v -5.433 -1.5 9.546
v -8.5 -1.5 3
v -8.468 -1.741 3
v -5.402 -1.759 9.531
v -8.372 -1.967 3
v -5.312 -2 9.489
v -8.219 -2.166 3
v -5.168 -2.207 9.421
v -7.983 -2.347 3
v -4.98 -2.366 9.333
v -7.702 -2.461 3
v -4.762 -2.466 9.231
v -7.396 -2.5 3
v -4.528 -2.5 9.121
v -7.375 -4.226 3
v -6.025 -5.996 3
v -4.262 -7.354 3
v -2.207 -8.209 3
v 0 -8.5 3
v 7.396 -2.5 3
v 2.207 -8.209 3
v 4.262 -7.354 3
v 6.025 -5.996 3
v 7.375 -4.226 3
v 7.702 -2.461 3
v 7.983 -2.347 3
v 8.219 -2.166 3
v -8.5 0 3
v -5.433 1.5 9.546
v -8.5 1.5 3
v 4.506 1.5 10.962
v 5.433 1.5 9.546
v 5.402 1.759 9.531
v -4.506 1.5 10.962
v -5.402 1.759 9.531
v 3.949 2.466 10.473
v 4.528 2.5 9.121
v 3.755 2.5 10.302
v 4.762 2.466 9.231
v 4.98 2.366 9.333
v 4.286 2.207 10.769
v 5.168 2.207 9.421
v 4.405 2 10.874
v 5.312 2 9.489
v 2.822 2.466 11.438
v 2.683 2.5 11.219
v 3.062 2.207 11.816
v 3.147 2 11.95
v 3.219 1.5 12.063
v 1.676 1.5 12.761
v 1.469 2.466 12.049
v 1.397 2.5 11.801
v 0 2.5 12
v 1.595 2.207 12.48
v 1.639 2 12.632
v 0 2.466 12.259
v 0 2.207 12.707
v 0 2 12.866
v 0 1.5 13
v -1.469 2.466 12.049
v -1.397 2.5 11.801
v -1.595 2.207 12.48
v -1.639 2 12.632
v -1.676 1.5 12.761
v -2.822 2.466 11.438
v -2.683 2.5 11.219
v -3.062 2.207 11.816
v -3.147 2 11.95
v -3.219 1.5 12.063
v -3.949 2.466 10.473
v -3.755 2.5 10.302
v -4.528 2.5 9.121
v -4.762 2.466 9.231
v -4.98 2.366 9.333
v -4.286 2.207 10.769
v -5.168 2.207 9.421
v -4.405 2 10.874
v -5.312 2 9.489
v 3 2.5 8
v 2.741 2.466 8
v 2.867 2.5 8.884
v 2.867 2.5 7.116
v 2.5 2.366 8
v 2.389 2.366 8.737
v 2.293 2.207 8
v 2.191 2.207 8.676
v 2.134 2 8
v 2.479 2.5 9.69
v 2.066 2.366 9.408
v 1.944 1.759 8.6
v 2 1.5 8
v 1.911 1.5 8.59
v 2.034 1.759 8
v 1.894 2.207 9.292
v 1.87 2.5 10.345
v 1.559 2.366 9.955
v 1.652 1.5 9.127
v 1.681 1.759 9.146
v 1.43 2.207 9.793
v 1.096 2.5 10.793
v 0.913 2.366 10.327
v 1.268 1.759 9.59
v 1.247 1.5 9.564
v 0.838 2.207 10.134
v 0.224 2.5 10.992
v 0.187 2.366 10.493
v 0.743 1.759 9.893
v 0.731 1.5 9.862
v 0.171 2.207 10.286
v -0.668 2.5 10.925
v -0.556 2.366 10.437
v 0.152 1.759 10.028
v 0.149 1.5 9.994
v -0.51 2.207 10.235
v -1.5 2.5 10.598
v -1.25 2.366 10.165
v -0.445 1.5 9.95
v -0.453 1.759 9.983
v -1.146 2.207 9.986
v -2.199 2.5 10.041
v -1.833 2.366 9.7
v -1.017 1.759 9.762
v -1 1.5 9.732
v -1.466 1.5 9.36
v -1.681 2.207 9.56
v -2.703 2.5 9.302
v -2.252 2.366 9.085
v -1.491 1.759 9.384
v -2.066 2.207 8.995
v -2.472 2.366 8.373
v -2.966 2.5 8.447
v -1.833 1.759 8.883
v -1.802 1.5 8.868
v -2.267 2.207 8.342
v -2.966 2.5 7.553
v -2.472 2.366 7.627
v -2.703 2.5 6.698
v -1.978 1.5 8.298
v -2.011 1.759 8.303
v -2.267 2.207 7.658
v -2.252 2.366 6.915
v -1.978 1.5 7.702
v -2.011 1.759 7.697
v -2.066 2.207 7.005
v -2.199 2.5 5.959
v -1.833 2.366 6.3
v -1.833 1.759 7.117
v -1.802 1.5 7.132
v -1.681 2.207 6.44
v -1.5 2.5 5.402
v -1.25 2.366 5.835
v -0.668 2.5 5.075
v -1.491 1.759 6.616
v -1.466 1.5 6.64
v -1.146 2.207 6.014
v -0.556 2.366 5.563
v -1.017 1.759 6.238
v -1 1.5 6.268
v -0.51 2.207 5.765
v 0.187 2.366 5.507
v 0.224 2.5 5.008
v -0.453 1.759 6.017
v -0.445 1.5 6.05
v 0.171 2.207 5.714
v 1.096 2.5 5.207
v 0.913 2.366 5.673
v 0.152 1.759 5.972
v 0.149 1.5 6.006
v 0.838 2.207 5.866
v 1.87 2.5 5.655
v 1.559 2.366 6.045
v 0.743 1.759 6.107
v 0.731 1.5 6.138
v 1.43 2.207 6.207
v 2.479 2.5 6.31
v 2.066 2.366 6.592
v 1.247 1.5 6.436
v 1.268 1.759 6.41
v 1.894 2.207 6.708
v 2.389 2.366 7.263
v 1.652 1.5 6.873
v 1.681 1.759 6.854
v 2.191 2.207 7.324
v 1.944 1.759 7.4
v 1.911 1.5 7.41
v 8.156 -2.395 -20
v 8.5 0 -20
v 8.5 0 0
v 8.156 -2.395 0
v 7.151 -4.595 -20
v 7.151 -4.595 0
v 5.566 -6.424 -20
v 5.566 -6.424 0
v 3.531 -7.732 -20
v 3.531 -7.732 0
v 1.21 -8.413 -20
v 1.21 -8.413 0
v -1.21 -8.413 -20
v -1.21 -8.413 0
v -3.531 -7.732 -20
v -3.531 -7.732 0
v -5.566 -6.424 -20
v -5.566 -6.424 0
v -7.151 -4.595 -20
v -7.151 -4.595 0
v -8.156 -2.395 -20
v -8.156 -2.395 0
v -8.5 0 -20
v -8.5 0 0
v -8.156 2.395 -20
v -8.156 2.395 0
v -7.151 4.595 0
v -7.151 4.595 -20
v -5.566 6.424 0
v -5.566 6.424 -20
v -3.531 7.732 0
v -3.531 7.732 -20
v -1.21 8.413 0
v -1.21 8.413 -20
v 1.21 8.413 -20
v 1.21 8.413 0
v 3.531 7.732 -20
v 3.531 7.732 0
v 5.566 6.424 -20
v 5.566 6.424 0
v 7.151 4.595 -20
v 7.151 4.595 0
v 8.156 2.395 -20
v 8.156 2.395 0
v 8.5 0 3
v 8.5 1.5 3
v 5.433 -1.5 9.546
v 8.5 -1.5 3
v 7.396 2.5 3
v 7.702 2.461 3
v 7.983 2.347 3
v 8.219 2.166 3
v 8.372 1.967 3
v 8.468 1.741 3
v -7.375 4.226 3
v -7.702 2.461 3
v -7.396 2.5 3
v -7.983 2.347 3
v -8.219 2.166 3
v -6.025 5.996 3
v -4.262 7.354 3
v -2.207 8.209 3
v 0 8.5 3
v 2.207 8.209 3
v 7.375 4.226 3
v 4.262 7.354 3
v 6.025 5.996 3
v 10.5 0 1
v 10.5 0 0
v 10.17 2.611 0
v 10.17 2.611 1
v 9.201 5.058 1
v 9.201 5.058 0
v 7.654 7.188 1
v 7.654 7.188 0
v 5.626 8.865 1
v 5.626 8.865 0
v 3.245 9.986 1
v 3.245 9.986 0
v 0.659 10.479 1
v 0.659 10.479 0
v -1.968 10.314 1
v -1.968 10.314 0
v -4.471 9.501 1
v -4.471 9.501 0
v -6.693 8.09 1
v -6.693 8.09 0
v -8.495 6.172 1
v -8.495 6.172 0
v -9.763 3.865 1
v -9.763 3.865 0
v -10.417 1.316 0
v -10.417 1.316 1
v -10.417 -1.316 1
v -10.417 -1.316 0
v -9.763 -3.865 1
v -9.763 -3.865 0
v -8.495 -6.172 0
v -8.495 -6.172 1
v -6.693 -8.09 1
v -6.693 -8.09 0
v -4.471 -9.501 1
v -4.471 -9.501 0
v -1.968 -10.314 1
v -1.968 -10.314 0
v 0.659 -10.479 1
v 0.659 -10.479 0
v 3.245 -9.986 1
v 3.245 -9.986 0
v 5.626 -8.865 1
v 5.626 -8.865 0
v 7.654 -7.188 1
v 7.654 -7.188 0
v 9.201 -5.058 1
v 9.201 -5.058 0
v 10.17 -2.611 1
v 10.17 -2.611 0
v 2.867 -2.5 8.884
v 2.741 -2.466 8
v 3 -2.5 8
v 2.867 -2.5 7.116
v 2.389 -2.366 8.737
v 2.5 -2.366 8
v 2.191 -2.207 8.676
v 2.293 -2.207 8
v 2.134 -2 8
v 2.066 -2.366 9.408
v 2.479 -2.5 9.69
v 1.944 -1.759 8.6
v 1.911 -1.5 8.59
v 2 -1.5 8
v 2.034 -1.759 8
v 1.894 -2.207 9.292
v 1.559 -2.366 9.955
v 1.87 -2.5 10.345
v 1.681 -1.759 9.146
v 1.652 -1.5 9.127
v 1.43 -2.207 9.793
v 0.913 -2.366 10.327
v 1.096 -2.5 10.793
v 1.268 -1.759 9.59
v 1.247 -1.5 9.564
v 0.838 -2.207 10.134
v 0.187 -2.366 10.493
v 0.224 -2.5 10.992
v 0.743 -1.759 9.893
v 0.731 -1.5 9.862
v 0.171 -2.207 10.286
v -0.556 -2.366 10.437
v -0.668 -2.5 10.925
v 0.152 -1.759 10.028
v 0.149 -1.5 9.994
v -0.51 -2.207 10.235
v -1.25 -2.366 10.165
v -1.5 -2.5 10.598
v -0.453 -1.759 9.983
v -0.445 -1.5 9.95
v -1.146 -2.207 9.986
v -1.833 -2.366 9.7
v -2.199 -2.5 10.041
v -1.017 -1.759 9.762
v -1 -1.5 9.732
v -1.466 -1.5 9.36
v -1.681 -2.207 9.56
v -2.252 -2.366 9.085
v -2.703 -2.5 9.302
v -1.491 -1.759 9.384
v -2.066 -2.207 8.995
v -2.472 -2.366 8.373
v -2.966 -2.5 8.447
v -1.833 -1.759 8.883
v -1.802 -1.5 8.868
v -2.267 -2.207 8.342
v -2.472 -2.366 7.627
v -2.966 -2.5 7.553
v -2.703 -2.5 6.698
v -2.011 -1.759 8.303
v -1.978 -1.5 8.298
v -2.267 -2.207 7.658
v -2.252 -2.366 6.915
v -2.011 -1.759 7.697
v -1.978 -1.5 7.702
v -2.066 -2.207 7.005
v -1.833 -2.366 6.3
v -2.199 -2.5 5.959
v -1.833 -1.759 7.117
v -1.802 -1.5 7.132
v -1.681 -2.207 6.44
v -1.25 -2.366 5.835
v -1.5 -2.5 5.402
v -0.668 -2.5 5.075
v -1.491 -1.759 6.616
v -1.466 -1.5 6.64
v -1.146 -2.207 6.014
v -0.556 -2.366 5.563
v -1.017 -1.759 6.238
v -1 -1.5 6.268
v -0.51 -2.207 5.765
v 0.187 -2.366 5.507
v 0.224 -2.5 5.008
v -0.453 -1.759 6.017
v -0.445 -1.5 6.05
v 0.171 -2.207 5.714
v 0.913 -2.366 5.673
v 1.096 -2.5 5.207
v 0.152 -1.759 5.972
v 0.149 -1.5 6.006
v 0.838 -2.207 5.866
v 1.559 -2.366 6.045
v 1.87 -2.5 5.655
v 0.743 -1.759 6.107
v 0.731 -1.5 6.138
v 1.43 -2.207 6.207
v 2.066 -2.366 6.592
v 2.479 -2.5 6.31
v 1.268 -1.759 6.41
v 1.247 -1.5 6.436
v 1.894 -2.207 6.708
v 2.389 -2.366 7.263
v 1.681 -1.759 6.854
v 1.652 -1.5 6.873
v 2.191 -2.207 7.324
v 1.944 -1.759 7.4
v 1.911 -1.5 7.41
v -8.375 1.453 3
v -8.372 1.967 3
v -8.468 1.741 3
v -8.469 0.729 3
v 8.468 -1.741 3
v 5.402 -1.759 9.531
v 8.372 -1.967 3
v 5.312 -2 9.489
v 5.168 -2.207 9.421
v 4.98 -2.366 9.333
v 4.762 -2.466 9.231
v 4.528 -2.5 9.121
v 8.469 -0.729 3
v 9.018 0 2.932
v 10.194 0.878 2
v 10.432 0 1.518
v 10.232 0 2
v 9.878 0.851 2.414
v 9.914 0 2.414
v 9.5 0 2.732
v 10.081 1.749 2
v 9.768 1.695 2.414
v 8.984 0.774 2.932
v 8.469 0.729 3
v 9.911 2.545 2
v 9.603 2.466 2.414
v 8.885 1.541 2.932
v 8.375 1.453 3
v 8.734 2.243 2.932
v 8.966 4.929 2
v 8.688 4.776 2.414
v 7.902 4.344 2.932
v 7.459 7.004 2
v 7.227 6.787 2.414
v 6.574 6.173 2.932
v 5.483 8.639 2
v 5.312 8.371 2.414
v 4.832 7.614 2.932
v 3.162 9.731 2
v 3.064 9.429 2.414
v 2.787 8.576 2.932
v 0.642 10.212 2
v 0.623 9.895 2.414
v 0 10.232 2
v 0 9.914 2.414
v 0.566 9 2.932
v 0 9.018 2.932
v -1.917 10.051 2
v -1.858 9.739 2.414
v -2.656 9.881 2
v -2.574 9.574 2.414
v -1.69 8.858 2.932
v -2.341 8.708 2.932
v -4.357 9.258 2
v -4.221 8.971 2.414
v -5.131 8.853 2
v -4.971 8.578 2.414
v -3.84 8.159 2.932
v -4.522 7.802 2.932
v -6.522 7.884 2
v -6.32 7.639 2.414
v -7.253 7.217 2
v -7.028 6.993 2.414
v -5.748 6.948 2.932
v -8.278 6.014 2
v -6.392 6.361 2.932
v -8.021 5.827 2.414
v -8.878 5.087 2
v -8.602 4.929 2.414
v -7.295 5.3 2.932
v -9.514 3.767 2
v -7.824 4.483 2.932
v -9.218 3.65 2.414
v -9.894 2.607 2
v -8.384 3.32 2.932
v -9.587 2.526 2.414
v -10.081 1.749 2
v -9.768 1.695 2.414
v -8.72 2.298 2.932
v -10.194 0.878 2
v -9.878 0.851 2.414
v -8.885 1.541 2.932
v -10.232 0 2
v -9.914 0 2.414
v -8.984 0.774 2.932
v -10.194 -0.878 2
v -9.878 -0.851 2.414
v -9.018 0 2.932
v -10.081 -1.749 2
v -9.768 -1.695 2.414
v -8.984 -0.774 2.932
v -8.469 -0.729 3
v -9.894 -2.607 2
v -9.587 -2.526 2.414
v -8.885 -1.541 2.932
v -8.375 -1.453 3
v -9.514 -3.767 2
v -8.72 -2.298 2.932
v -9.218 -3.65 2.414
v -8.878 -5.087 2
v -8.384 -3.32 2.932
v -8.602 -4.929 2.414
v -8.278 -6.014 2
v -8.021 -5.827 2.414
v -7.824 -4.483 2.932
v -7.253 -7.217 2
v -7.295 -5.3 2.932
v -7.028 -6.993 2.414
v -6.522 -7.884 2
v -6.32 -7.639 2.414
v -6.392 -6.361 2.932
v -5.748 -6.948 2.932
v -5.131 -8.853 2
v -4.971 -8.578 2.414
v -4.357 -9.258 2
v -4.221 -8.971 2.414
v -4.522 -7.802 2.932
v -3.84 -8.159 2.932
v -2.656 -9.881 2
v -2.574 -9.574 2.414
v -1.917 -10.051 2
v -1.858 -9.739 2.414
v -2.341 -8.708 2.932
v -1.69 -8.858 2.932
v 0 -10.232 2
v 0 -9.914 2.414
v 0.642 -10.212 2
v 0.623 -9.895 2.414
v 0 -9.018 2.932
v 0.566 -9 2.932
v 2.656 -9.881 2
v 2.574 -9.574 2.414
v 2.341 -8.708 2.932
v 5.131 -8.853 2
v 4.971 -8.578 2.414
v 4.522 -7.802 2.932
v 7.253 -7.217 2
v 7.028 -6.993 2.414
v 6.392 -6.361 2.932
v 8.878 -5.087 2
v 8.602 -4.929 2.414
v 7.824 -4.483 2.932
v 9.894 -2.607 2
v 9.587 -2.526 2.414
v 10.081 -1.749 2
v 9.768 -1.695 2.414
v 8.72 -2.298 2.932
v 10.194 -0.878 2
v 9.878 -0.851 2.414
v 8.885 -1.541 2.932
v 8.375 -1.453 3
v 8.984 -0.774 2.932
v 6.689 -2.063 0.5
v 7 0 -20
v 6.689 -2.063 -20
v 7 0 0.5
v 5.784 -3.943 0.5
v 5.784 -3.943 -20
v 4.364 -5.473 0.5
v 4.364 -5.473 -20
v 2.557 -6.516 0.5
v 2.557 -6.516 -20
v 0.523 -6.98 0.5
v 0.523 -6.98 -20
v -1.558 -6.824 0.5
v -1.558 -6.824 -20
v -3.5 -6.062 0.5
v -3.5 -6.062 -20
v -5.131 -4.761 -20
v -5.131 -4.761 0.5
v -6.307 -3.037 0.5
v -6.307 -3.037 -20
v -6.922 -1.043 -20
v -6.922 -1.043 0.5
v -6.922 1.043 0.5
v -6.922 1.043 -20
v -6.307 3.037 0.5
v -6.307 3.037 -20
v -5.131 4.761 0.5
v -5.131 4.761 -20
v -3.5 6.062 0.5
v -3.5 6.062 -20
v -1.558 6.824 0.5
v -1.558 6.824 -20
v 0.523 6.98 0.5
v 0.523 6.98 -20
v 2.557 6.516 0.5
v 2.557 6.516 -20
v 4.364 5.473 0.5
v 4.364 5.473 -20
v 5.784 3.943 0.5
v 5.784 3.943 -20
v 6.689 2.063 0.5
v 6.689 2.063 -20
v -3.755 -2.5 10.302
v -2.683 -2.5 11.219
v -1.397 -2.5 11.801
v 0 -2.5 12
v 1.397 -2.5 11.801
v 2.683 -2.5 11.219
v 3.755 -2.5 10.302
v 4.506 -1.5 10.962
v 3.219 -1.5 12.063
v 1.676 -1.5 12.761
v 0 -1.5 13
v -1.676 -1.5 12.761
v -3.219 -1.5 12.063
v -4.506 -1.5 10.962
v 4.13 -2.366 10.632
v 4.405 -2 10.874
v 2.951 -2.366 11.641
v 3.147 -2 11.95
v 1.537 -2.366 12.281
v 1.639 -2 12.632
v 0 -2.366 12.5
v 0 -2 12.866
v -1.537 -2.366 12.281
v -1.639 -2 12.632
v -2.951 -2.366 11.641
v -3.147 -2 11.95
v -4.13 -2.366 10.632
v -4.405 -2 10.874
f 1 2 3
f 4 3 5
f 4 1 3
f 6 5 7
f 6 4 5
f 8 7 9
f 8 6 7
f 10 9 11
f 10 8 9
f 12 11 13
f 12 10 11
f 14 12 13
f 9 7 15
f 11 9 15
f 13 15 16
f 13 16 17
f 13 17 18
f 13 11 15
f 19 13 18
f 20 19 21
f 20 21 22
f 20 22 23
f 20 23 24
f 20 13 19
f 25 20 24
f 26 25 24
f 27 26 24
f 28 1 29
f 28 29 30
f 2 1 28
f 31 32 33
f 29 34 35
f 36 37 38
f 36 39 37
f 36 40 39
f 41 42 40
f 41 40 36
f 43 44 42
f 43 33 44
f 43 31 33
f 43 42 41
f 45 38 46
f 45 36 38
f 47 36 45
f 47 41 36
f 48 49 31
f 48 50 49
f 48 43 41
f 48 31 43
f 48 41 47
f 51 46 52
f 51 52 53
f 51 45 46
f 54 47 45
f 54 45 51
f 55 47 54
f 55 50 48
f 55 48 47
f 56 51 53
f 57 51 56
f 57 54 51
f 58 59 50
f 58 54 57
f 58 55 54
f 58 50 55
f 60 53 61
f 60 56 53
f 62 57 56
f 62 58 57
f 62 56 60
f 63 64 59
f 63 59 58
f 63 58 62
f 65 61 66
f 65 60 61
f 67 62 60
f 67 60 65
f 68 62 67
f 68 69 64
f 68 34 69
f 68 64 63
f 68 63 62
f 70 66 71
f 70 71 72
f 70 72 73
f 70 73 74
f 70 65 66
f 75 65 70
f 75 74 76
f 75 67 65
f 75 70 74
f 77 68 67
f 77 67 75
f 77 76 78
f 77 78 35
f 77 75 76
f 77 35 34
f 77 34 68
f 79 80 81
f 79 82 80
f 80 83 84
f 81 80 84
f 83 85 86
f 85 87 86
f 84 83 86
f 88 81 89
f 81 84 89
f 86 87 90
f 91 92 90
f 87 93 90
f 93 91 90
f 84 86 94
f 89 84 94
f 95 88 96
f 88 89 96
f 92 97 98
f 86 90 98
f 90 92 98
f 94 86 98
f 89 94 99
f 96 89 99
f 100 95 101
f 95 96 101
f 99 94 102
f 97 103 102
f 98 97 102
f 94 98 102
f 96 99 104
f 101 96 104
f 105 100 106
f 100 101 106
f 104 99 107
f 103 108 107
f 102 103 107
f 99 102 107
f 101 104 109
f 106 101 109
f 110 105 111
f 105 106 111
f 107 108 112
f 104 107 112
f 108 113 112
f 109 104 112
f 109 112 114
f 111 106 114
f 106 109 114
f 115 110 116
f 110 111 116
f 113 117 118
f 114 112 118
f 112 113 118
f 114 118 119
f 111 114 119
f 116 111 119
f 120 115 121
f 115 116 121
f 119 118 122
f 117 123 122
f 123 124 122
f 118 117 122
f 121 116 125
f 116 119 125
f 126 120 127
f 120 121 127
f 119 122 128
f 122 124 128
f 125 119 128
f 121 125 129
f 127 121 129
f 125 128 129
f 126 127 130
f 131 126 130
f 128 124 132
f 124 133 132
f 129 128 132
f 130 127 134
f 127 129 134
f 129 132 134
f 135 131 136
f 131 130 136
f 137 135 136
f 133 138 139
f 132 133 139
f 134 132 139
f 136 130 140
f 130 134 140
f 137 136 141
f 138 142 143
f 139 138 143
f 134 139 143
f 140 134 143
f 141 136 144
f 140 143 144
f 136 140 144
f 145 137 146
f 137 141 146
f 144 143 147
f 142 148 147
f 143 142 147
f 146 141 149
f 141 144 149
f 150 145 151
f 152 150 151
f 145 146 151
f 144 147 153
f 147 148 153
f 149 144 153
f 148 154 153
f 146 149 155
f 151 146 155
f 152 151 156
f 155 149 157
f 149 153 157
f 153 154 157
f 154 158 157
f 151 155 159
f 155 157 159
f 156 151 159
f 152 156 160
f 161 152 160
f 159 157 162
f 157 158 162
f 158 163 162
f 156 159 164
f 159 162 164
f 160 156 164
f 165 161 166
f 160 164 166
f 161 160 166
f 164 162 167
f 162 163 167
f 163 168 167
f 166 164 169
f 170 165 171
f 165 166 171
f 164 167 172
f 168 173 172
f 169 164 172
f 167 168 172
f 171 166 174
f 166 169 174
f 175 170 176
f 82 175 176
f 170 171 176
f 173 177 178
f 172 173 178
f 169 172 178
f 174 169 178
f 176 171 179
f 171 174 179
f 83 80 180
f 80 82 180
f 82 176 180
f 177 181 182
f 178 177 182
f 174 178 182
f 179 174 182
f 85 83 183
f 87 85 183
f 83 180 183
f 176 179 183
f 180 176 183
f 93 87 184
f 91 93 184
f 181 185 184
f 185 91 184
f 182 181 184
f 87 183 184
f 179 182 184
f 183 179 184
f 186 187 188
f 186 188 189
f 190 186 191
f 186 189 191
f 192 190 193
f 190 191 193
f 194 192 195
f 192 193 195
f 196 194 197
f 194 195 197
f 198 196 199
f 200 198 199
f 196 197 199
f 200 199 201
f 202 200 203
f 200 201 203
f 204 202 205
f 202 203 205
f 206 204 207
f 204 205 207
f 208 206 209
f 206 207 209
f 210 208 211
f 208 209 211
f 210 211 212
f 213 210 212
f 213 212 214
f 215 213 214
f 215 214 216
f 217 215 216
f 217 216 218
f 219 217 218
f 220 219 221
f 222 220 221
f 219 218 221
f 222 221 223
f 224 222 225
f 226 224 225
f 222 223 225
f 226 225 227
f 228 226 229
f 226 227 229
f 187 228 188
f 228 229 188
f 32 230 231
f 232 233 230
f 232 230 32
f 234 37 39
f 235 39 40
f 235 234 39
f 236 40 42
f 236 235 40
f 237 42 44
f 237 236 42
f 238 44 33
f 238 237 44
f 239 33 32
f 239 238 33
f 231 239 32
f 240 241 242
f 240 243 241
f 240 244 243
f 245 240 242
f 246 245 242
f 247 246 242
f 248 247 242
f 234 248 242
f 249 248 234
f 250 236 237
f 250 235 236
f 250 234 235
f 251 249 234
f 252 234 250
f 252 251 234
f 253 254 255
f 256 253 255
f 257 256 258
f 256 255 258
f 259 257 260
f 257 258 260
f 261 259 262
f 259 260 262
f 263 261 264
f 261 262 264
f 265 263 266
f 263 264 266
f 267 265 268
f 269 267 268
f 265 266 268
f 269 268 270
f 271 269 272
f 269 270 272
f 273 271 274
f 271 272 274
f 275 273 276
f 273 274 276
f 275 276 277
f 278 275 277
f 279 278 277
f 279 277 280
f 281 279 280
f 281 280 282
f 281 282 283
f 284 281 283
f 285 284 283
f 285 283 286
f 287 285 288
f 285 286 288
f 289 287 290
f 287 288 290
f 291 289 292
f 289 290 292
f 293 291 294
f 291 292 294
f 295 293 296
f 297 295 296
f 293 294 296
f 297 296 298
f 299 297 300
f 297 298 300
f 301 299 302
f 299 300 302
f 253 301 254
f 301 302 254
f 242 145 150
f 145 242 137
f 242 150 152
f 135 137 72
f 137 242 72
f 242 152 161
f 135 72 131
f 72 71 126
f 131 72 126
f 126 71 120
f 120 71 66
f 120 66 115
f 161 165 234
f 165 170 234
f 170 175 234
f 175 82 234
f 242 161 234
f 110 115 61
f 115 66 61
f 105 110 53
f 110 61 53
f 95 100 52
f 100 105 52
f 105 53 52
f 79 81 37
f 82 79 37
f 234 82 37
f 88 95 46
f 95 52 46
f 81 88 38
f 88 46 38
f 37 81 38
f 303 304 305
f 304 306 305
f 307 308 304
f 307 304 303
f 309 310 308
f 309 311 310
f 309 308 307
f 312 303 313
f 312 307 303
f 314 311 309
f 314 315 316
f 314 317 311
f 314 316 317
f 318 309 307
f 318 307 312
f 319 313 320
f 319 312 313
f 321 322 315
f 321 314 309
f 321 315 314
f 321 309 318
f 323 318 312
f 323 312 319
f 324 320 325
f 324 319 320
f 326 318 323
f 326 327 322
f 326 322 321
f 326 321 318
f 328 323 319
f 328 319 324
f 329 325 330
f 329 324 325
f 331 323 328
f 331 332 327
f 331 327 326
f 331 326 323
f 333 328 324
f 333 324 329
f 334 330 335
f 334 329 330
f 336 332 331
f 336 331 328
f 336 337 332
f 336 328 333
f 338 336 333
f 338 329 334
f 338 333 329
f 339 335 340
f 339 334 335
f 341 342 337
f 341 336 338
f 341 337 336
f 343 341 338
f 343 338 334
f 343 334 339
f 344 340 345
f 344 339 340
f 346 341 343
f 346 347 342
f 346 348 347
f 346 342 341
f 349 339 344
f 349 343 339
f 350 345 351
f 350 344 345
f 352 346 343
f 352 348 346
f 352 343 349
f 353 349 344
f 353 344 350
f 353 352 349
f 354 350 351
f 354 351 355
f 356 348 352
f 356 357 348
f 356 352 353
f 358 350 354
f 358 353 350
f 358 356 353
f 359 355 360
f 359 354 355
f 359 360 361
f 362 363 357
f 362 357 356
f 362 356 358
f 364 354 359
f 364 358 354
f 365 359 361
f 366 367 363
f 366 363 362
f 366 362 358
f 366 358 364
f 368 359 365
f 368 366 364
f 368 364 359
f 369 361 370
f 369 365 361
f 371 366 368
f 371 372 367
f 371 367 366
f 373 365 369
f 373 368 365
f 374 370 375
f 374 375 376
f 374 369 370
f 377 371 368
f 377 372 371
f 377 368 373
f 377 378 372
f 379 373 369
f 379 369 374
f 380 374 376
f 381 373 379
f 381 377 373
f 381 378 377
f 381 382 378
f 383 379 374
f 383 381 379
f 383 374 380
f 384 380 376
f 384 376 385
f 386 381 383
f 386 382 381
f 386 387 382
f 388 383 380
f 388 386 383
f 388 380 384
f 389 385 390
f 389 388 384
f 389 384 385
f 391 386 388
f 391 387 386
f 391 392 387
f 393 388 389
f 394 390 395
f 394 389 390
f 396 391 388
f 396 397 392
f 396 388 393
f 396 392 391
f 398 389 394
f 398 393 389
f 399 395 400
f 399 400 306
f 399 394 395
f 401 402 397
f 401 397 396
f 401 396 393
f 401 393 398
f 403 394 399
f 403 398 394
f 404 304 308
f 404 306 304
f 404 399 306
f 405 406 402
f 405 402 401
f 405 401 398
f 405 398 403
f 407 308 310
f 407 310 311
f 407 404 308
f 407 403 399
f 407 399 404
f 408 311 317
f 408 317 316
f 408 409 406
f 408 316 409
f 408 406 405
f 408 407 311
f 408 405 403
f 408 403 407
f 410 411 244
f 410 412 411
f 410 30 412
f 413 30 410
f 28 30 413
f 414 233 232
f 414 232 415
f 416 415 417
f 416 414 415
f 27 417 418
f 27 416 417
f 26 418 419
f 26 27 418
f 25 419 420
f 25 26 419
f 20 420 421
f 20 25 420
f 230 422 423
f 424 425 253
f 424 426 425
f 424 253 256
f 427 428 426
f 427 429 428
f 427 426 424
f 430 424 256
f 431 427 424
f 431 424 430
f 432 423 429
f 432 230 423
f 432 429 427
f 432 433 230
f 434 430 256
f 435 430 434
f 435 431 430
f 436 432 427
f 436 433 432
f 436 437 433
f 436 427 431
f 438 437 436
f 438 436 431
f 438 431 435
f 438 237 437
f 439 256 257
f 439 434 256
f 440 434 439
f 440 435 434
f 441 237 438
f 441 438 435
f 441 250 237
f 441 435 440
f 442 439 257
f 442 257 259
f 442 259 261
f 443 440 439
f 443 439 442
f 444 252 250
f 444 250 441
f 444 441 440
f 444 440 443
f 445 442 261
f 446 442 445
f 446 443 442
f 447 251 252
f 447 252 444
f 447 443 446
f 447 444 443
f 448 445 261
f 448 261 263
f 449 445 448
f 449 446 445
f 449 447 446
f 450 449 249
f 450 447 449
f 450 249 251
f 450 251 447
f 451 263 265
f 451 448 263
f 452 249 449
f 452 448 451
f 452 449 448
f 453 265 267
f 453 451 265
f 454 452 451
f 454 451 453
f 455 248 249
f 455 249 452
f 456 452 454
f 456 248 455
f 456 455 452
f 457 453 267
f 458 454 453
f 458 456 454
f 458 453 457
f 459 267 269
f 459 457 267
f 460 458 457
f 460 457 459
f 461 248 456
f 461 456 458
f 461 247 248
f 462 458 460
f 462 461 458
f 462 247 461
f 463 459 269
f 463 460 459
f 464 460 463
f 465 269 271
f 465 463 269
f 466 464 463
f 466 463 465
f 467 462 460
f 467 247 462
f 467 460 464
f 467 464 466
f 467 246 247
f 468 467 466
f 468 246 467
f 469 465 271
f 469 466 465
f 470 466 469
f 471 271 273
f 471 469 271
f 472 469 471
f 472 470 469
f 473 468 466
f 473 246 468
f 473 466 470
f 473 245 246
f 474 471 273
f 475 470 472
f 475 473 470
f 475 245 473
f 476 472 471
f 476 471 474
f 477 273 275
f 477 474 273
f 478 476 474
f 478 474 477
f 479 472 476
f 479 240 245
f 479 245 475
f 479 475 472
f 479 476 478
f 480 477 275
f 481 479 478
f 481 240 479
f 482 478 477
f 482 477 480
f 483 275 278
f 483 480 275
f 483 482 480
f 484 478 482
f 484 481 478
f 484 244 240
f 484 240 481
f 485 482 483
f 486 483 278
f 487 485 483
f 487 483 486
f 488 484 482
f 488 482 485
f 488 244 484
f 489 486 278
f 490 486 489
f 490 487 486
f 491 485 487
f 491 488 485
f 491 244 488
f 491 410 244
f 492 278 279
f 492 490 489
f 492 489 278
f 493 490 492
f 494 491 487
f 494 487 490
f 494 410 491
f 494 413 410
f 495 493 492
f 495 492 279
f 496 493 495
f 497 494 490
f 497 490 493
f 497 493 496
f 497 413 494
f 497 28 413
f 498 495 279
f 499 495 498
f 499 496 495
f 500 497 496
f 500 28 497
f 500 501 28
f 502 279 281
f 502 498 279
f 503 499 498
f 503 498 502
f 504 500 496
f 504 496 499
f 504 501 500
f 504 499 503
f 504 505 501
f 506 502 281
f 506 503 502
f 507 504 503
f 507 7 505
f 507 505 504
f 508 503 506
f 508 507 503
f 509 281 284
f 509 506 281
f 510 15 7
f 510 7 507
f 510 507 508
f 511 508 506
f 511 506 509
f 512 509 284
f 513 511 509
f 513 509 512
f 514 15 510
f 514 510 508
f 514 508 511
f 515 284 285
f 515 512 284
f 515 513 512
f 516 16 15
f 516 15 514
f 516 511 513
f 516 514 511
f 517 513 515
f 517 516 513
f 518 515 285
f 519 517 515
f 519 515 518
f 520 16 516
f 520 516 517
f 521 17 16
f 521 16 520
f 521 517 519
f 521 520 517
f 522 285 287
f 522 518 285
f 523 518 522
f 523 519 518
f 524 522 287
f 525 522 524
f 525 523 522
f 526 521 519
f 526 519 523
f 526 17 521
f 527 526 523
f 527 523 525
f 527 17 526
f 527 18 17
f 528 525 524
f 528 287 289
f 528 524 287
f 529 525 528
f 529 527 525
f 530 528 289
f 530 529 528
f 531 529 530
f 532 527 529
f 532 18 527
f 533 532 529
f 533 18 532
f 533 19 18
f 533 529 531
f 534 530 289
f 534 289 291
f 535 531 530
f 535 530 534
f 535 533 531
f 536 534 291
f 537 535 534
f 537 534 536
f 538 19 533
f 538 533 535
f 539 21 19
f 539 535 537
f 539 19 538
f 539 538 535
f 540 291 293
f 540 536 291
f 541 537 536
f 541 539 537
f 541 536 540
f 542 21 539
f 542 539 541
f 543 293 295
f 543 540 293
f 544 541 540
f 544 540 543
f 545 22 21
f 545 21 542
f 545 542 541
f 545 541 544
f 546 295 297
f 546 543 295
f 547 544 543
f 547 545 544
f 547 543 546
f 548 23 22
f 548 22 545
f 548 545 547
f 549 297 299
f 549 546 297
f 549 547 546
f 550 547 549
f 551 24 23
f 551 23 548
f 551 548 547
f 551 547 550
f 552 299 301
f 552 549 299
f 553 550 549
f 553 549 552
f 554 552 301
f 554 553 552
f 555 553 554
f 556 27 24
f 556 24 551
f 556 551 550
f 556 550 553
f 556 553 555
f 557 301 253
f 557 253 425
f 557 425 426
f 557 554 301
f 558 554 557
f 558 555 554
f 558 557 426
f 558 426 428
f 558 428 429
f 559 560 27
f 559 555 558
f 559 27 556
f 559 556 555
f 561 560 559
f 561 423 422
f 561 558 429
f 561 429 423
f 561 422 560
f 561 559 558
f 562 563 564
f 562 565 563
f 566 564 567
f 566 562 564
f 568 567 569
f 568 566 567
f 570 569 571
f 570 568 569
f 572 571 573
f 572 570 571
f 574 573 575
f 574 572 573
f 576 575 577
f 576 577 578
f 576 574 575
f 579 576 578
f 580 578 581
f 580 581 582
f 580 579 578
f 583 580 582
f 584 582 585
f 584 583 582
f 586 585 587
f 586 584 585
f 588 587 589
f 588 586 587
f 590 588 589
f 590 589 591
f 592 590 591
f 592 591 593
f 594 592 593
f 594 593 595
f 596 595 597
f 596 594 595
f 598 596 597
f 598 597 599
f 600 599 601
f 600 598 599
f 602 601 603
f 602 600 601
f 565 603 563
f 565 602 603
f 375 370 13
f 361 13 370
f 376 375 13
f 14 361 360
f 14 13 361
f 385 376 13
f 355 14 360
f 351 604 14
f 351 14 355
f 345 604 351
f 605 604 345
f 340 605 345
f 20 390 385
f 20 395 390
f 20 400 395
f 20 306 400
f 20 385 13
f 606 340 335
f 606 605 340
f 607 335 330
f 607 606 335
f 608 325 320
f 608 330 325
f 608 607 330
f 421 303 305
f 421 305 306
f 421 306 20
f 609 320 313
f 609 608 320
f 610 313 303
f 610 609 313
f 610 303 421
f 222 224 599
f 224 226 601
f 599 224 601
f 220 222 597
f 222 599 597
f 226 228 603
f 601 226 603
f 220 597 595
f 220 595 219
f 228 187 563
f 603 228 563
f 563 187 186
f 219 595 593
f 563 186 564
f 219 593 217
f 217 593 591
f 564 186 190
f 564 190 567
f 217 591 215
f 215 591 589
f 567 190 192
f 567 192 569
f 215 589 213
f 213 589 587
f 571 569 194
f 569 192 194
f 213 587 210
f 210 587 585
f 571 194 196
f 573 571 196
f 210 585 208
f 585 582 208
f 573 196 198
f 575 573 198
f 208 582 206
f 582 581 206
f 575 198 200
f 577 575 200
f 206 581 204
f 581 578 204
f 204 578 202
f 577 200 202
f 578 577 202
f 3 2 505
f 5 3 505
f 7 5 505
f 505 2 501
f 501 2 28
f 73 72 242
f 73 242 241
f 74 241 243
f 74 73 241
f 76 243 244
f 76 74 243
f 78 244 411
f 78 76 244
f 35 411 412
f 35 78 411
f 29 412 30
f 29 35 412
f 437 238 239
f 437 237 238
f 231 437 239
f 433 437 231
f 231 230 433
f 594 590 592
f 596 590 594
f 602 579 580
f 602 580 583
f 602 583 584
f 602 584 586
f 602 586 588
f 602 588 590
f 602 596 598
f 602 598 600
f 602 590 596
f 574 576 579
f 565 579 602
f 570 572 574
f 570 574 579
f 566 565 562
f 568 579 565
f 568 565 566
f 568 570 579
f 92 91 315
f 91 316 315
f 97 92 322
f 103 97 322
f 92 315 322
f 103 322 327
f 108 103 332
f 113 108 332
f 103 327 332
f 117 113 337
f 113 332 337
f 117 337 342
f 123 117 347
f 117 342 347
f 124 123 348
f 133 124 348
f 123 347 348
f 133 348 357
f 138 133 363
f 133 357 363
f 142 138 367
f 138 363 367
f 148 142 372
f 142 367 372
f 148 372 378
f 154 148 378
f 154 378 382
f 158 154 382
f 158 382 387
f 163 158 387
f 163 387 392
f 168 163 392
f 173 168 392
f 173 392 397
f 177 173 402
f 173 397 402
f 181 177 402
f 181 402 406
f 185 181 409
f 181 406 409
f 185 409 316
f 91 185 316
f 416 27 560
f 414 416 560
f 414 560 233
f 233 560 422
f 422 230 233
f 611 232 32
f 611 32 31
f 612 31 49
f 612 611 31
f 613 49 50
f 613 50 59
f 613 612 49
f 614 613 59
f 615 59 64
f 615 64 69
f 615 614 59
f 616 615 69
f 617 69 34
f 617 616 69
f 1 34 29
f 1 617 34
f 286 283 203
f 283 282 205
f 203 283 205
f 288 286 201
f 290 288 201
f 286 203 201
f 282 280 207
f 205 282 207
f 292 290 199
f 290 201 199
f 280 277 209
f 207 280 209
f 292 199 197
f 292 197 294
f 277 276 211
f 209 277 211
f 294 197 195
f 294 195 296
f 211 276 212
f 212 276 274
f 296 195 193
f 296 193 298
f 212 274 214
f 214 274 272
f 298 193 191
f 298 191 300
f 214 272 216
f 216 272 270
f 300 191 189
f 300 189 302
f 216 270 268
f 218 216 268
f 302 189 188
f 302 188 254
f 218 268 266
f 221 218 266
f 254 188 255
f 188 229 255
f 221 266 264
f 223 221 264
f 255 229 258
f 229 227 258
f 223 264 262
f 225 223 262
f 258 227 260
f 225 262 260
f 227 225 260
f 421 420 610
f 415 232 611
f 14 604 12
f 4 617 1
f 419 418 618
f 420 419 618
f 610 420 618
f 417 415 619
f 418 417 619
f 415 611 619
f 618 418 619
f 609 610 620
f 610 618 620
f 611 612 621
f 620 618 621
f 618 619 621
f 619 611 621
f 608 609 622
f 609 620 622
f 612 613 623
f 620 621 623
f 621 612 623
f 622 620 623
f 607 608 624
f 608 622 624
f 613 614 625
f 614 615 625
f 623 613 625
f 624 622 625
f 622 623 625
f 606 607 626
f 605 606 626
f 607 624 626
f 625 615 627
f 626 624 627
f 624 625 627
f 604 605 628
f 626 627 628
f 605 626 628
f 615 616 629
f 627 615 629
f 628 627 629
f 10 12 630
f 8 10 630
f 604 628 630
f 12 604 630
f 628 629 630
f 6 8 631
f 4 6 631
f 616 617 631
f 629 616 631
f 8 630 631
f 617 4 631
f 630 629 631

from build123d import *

# Parameters (mm, degrees)
F0_R          = 10.5
F1_DEPTH      = 3
F2_R          = 2
F3_R          = 7
F4_DEPTH      = 0.5
F5_W          = 1.5
F5_H          = 20
F7_R          = 2
F8_DEPTH      = 2.5
F8_DEPTH_BACK = 2.5
F9_T8_DEPTH   = 9.7284161474
F9_T13_DEPTH  = 9.7284161474
F9_T16_ANGLE  = 129.7914851202
F9_T20_DEPTH  = 9.7284161474
F9_T23_ANGLE  = 129.7914851202
F9_T27_DEPTH  = 9.7284161474


# Not quite as in the source:
# - a fillet or chamfer that OpenCascade refuses, or shapes differently, is made with other operations: its cross-section is extruded or revolved along the edge and cut away or added


with BuildPart() as f1:
    # F0 (on Top) → F1 (new body)
    with BuildSketch(Plane.XY):
        Circle(F0_R)
    extrude(amount=F1_DEPTH)

    # F2
    f2_edges = [f1.edges().sort_by_distance(p)[0] for p in [
        (-10.5, 0, 3),
    ]]
    fillet(f2_edges, radius=F2_R)

    # F3 (on face) → F4 (cut)
    with BuildSketch(Plane(origin=(0, 0, 0), x_dir=(1, 0, 0), z_dir=(0, 0, -1))):
        Circle(F3_R)
    extrude(amount=-F4_DEPTH, mode=Mode.SUBTRACT)

    # F5 (on Front) → F6 (revolve)
    with BuildSketch(Plane.XZ):
        with Locations((7.75, -10)):
            Rectangle(F5_W, F5_H)
    revolve(axis=Axis((0, 0, -11.0487695783), (0, 0, -1)))

    # F7 (on Front) → F8 (join, two sides)
    with BuildSketch(Plane.XZ) as f8_sk:
        with BuildLine():
            Line((-5.4332236548, 9.5456002665), (-8.5, 3))
            Line((-8.5, 3), (8.5, 3))
            Line((8.5, 3), (5.4332236548, 9.5456002665))
            ThreePointArc((5.4332236548, 9.5456002665), (0, 13), (-5.4332236548, 9.5456002665))
        make_face()
        with Locations((0, 8)):
            Circle(F7_R, mode=Mode.SUBTRACT)
    extrude(amount=F8_DEPTH)
    extrude(f8_sk.sketch, amount=-F8_DEPTH_BACK)

    # F9: fillet of radius 1 on 4 edges, made by hand

    # F9_s1 → F9_t2 (revolve, cut)
    with BuildSketch(Plane.XY.offset(8)):
        with BuildLine():
            ThreePointArc((3, 2.5), (2.2928932188, 2.2071067812), (2, 1.5))
            Line((2, 1.5), (2, 2.5))
            Line((2, 2.5), (3, 2.5))
        make_face()
    revolve(axis=Axis((0, 2.5, 8), (0, -1, 0)), mode=Mode.SUBTRACT)

    # F9_s3 → F9_t4 (revolve, cut)
    with BuildSketch(Plane.XY.offset(8)):
        with BuildLine():
            ThreePointArc((3, -2.5), (2.2928932188, -2.2071067812), (2, -1.5))
            Line((2, -1.5), (2, -2.5))
            Line((2, -2.5), (3, -2.5))
        make_face()
    revolve(axis=Axis((0, -2.5, 8), (0, -1, 0)), mode=Mode.SUBTRACT)


with BuildPart() as f9_tool6:
    # F9_s7 → F9_t8 (new body)
    with BuildSketch(Plane(origin=(1.4381178705, 0, -3.0694591509), x_dir=(0, 1, 0), z_dir=(-0.4242667111, 0, 0.9055372758))):
        with BuildLine():
            ThreePointArc((-1.5, -8.9698669776), (-2.2071067812, -8.6769737588), (-2.5, -7.9698669776))
            Line((-2.5, -7.9698669776), (-2.5, -8.9698669776))
            Line((-2.5, -8.9698669776), (-1.5, -8.9698669776))
        make_face()
    extrude(amount=F9_T8_DEPTH)

    split(bisect_by=Plane.XY.offset(3), keep=Keep.TOP)


with BuildPart() as f1_1:
    add(f1.part)

    # F9_t5: cut F9_tool6
    add(f9_tool6.part, mode=Mode.SUBTRACT)


with BuildPart() as f9_tool11:
    # F9_s12 → F9_t13 (new body)
    with BuildSketch(Plane(origin=(1.4381178705, 0, -3.0694591509), x_dir=(0, 1, 0), z_dir=(-0.4242667111, 0, 0.9055372758))):
        with BuildLine():
            ThreePointArc((2.5, -7.9698669776), (2.2071067812, -8.6769737588), (1.5, -8.9698669776))
            Line((1.5, -8.9698669776), (2.5, -8.9698669776))
            Line((2.5, -8.9698669776), (2.5, -7.9698669776))
        make_face()
    extrude(amount=F9_T13_DEPTH)

    split(bisect_by=Plane.XY.offset(3), keep=Keep.TOP)


with BuildPart() as f1_2:
    add(f1_1.part)

    # F9_t10: cut F9_tool11
    add(f9_tool11.part, mode=Mode.SUBTRACT)

    # F9_s15 → F9_t16 (revolve, cut)
    with BuildSketch(Plane(origin=(-2.6893252524, 0, 5.7399843051), x_dir=(0, 1, 0), z_dir=(0.4242667111, 0, -0.9055372758))):
        with BuildLine():
            ThreePointArc((2.5, 7.9698669776), (2.2071067812, 8.6769737588), (1.5, 8.9698669776))
            Line((1.5, 8.9698669776), (2.5, 8.9698669776))
            Line((2.5, 8.9698669776), (2.5, 7.9698669776))
        make_face()
    revolve(axis=Axis((0, 2.5, 7), (0, -1, 0)), revolution_arc=F9_T16_ANGLE, mode=Mode.SUBTRACT)


with BuildPart() as f9_tool18:
    # F9_s19 → F9_t20 (new body)
    with BuildSketch(Plane(origin=(2.6893252524, 0, 5.7399843051), x_dir=(0, 1, 0), z_dir=(-0.4242667111, 0, -0.9055372758))):
        with BuildLine():
            ThreePointArc((2.5, -7.9698669776), (2.2071067812, -8.6769737588), (1.5, -8.9698669776))
            Line((1.5, -8.9698669776), (2.5, -8.9698669776))
            Line((2.5, -8.9698669776), (2.5, -7.9698669776))
        make_face()
    extrude(amount=F9_T20_DEPTH)

    split(bisect_by=Plane.XY.offset(3), keep=Keep.TOP)


with BuildPart() as f1_3:
    add(f1_2.part)

    # F9_t17: cut F9_tool18
    add(f9_tool18.part, mode=Mode.SUBTRACT)

    # F9_s22 → F9_t23 (revolve, cut)
    with BuildSketch(Plane(origin=(-2.6893252524, 0, 5.7399843051), x_dir=(0, 1, 0), z_dir=(0.4242667111, 0, -0.9055372758))):
        with BuildLine():
            ThreePointArc((-2.5, 7.9698669776), (-2.2071067812, 8.6769737588), (-1.5, 8.9698669776))
            Line((-1.5, 8.9698669776), (-2.5, 8.9698669776))
            Line((-2.5, 8.9698669776), (-2.5, 7.9698669776))
        make_face()
    revolve(axis=Axis((0, -2.5, 7), (0, -1, 0)), revolution_arc=F9_T23_ANGLE, mode=Mode.SUBTRACT)


with BuildPart() as f9_tool25:
    # F9_s26 → F9_t27 (new body)
    with BuildSketch(Plane(origin=(2.6893252524, 0, 5.7399843051), x_dir=(0, 1, 0), z_dir=(-0.4242667111, 0, -0.9055372758))):
        with BuildLine():
            ThreePointArc((-1.5, -8.9698669776), (-2.2071067812, -8.6769737588), (-2.5, -7.9698669776))
            Line((-2.5, -7.9698669776), (-2.5, -8.9698669776))
            Line((-2.5, -8.9698669776), (-1.5, -8.9698669776))
        make_face()
    extrude(amount=F9_T27_DEPTH)

    split(bisect_by=Plane.XY.offset(3), keep=Keep.TOP)


with BuildPart() as f1_4:
    add(f1_3.part)

    # F9_t24: cut F9_tool25
    add(f9_tool25.part, mode=Mode.SUBTRACT)


solid = f1_4.part
